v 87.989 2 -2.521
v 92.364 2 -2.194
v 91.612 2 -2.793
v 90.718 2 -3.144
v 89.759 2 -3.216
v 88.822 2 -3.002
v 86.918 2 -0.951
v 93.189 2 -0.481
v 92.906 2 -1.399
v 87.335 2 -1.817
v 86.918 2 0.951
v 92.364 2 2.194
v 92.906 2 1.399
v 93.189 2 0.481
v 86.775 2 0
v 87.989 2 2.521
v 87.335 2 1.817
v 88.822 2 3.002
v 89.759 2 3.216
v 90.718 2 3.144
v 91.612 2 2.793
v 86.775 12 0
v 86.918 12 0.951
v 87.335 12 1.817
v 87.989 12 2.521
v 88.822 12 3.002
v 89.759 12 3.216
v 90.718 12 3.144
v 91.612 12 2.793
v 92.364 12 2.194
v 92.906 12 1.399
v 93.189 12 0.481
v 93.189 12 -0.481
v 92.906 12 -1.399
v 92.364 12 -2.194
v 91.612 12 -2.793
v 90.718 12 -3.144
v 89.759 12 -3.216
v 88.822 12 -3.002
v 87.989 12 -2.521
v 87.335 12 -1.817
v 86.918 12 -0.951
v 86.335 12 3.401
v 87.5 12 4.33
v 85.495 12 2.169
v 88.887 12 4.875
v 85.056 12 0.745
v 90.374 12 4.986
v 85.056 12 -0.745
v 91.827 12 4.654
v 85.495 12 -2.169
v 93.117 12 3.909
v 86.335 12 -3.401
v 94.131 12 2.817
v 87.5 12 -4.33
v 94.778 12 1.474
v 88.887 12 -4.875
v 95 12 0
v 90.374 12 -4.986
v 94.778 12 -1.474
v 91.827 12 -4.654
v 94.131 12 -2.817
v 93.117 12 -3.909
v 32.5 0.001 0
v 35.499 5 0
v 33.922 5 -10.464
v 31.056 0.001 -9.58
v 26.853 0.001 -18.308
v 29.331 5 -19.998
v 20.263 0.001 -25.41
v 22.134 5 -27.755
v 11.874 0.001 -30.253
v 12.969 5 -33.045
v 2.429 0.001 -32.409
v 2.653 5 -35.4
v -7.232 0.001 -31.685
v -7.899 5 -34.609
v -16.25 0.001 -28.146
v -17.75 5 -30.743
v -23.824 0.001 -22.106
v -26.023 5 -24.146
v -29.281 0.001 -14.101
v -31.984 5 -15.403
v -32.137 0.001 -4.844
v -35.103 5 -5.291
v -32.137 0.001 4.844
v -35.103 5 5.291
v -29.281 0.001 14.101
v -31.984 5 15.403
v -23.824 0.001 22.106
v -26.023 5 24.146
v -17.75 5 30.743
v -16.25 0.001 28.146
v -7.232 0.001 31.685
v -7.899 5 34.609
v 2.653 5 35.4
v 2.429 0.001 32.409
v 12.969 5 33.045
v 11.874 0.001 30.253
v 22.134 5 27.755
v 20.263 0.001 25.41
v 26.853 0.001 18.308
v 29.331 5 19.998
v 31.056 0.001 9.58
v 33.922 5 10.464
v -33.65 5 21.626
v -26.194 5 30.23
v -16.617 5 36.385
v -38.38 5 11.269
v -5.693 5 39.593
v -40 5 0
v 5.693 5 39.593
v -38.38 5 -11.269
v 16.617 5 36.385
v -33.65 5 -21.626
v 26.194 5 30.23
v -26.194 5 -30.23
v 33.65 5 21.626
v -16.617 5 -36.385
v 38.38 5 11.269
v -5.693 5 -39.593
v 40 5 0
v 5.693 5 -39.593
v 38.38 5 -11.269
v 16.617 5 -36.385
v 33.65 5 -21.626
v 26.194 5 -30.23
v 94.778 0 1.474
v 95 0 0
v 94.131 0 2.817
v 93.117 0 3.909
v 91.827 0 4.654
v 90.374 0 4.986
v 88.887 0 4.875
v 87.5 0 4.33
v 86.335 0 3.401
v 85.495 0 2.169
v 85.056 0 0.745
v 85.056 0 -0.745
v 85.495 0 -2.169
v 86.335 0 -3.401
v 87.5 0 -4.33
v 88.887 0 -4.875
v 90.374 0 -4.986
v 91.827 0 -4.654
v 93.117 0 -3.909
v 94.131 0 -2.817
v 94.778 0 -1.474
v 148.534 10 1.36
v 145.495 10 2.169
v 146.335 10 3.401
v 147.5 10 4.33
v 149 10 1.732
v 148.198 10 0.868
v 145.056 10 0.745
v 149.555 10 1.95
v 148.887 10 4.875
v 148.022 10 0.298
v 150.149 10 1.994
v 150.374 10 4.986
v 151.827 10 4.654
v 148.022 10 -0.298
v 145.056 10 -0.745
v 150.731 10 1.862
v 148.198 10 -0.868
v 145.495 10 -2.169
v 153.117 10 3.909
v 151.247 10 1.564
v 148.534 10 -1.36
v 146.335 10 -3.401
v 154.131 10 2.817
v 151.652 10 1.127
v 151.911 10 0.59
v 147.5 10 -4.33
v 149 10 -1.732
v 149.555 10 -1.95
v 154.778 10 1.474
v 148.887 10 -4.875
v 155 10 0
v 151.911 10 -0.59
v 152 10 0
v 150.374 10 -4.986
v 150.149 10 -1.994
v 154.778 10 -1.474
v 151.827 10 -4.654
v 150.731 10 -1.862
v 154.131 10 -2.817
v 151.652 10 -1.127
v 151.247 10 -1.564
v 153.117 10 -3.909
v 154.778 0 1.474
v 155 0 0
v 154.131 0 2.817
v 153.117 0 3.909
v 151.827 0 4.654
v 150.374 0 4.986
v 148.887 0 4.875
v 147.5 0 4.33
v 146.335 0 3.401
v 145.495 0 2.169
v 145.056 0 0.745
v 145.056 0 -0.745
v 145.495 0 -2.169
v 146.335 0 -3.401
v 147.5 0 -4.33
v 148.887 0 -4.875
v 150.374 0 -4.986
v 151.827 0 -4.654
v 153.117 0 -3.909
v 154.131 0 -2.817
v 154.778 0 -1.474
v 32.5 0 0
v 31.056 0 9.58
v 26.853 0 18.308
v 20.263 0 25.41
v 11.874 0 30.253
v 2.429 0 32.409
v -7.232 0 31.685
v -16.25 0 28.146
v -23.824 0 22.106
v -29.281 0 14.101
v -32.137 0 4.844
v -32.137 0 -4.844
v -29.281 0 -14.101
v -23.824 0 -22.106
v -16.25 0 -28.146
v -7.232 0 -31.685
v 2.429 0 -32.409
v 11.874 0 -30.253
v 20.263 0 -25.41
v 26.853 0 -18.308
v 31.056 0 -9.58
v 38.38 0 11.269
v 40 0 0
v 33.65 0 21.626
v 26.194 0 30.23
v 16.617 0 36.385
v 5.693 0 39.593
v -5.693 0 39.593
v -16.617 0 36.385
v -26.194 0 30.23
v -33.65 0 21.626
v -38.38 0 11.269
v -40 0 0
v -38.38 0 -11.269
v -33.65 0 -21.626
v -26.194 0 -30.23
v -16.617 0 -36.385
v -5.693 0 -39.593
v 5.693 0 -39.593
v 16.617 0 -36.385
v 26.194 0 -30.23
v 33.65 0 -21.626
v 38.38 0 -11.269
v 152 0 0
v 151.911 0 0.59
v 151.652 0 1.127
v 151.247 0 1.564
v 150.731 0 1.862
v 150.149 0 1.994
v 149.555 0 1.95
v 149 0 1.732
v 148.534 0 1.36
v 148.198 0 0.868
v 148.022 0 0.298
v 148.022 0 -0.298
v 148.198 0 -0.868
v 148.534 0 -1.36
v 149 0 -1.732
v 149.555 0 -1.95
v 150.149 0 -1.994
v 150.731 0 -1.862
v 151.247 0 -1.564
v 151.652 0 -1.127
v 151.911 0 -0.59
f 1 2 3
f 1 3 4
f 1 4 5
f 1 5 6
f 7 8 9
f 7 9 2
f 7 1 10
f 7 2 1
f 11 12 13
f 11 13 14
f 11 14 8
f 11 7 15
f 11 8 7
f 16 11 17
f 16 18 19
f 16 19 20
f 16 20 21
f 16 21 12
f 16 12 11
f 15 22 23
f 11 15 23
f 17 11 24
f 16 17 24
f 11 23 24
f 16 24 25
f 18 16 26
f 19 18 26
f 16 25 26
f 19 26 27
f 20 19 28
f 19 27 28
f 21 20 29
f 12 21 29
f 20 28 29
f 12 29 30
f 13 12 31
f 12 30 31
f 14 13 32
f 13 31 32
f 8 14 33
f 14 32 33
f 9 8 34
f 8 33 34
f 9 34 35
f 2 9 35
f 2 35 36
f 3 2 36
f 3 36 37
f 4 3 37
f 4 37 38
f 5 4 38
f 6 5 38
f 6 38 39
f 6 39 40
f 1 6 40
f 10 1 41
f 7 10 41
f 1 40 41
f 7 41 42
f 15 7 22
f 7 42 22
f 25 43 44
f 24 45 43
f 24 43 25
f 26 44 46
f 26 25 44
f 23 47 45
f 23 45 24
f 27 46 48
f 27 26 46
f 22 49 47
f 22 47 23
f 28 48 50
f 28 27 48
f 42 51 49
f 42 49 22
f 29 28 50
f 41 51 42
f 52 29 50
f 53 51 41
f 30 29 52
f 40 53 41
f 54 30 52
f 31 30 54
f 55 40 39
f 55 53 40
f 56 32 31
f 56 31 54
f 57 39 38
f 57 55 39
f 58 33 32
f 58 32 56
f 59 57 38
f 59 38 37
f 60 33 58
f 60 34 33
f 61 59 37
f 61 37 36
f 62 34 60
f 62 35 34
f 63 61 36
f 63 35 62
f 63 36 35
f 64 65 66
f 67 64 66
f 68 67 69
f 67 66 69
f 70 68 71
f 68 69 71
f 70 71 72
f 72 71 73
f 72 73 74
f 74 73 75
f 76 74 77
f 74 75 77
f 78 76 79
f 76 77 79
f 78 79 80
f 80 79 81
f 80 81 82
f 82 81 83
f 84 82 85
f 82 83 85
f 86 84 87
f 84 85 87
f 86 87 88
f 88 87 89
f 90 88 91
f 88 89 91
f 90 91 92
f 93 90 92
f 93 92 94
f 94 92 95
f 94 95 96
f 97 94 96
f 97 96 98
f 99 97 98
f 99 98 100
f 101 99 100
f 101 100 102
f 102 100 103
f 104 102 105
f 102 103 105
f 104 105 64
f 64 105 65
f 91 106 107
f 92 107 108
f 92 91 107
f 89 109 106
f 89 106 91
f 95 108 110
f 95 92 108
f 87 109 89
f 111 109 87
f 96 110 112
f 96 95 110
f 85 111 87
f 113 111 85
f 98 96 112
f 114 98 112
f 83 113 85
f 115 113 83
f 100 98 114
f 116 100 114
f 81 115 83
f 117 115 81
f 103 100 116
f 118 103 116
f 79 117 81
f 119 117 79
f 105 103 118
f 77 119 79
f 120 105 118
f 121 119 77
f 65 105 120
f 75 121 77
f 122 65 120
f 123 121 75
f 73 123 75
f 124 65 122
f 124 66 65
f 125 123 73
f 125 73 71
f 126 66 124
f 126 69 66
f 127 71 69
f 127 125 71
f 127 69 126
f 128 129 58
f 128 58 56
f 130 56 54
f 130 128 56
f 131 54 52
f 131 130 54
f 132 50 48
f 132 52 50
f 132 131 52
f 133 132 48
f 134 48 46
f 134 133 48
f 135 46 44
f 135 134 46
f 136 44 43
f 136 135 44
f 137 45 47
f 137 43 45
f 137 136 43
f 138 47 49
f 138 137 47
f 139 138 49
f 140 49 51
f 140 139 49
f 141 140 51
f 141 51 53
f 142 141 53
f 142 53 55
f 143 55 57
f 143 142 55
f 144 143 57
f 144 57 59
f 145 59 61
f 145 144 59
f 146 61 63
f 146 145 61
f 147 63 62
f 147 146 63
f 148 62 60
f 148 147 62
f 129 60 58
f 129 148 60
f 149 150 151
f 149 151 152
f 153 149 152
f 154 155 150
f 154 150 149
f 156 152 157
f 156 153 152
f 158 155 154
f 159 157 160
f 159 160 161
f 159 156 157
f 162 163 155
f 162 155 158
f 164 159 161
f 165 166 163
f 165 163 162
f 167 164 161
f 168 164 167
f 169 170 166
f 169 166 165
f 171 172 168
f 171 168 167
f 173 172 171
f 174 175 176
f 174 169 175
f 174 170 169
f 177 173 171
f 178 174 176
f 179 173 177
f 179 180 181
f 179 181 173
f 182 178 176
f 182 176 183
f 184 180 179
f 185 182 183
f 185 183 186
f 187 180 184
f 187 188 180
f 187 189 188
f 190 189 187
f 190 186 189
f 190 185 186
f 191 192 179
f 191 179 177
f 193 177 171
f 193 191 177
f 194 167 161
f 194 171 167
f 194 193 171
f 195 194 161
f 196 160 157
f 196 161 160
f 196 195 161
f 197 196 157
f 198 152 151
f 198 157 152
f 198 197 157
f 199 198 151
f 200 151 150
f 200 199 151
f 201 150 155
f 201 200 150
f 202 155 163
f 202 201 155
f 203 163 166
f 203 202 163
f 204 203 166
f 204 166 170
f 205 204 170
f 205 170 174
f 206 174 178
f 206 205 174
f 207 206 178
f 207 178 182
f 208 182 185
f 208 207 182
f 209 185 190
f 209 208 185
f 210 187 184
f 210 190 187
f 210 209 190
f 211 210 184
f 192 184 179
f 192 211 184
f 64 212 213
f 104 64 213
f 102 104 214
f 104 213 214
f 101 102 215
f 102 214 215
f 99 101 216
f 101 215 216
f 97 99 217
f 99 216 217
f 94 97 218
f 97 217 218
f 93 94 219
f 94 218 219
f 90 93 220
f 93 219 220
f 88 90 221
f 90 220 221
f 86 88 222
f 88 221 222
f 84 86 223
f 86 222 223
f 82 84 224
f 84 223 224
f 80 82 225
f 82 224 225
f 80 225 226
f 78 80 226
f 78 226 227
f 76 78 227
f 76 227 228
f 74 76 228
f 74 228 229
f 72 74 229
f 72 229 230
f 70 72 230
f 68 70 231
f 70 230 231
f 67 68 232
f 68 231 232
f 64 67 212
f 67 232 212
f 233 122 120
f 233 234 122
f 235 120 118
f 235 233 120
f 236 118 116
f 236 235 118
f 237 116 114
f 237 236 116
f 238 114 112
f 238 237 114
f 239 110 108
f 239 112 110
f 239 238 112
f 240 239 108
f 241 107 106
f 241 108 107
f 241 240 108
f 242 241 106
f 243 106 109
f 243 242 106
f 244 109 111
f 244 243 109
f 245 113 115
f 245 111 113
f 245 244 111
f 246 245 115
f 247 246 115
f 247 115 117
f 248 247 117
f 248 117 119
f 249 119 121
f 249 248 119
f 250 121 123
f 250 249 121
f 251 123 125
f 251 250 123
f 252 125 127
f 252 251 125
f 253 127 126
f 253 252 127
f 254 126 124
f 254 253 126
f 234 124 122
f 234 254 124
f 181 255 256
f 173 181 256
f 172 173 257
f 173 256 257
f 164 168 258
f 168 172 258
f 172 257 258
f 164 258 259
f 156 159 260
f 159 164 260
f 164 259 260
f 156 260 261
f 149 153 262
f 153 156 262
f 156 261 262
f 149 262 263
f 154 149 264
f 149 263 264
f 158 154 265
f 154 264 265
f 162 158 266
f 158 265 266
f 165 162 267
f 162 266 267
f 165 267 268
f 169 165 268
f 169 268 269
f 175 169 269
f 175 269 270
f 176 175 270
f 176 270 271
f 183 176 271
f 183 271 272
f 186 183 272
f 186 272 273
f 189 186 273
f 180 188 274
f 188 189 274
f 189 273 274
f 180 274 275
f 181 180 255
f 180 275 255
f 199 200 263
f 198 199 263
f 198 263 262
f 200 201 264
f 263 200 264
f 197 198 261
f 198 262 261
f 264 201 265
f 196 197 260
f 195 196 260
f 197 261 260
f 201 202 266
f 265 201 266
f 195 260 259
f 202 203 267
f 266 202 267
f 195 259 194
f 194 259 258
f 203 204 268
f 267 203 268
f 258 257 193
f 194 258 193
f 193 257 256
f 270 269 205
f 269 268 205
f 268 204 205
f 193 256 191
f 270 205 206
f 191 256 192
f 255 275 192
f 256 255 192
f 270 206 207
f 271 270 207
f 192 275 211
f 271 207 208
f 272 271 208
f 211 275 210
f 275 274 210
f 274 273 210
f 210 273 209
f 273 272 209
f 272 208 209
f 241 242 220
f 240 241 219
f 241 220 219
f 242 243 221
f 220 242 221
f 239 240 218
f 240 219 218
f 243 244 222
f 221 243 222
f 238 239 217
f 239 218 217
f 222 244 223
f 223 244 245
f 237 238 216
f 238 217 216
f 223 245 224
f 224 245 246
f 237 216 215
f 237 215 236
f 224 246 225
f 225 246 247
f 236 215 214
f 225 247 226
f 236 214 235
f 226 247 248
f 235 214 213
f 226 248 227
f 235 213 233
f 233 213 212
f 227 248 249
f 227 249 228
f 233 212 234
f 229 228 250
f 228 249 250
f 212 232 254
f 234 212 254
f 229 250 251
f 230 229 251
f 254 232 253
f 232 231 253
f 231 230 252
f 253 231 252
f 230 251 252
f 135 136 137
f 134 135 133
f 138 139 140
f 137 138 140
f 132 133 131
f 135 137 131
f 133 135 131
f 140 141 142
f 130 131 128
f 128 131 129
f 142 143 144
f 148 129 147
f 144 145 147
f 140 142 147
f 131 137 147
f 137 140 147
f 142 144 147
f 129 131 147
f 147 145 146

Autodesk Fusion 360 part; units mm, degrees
sketch "Sketch1" plane through (0, 0, 0) normal (0, 1, 0) x (1, 0, 0)
  circle A0 centre (0, 0) radius 32.5
  circle A1 centre (0, 0) radius 40
  dimension "d1" = 65
  dimension "d2" = 80
extrude "Extrude1" add sketch "Sketch1" along normal blind 5 makes body 1
chamfer "Chamfer1" distance 3 distance2 5 1 edges at (-30.3006, 5, -11.7525) measured on face at (37.2301, 5, 3.6019) on bodies 1
sketch "Sketch2" plane through (0, 0, 0) normal (0, 1, 0) x (1, 0, 0)
  circle A0 centre (90, 0) radius 5
  dimension "d9" = 10
extrude "Extrude2" add sketch "Sketch2" along normal blind 12 separate body makes body 2
sketch "Sketch3" plane through (0, 12, 0) normal (0, 1, 0) x (-1, 0, 0)
  circle A0 centre (-90, 0) radius 5
  circle A1 centre (-90, 0) radius 3.225
  dimension "d12" = 6.45
extrude "Extrude3" cut sketch "Sketch3" against normal blind 10 contours A1 bodies 2
sketch "Sketch4" plane through (0, 0, 0) normal (0, 1, 0) x (1, 0, 0)
  circle A0 centre (150, 0) radius 2
  circle A1 centre (150, 0) radius 5
  dimension "d15" = 4
  dimension "d16" = 10
extrude "Extrude4" add sketch "Sketch4" along normal blind 10 separate body makes body 3
